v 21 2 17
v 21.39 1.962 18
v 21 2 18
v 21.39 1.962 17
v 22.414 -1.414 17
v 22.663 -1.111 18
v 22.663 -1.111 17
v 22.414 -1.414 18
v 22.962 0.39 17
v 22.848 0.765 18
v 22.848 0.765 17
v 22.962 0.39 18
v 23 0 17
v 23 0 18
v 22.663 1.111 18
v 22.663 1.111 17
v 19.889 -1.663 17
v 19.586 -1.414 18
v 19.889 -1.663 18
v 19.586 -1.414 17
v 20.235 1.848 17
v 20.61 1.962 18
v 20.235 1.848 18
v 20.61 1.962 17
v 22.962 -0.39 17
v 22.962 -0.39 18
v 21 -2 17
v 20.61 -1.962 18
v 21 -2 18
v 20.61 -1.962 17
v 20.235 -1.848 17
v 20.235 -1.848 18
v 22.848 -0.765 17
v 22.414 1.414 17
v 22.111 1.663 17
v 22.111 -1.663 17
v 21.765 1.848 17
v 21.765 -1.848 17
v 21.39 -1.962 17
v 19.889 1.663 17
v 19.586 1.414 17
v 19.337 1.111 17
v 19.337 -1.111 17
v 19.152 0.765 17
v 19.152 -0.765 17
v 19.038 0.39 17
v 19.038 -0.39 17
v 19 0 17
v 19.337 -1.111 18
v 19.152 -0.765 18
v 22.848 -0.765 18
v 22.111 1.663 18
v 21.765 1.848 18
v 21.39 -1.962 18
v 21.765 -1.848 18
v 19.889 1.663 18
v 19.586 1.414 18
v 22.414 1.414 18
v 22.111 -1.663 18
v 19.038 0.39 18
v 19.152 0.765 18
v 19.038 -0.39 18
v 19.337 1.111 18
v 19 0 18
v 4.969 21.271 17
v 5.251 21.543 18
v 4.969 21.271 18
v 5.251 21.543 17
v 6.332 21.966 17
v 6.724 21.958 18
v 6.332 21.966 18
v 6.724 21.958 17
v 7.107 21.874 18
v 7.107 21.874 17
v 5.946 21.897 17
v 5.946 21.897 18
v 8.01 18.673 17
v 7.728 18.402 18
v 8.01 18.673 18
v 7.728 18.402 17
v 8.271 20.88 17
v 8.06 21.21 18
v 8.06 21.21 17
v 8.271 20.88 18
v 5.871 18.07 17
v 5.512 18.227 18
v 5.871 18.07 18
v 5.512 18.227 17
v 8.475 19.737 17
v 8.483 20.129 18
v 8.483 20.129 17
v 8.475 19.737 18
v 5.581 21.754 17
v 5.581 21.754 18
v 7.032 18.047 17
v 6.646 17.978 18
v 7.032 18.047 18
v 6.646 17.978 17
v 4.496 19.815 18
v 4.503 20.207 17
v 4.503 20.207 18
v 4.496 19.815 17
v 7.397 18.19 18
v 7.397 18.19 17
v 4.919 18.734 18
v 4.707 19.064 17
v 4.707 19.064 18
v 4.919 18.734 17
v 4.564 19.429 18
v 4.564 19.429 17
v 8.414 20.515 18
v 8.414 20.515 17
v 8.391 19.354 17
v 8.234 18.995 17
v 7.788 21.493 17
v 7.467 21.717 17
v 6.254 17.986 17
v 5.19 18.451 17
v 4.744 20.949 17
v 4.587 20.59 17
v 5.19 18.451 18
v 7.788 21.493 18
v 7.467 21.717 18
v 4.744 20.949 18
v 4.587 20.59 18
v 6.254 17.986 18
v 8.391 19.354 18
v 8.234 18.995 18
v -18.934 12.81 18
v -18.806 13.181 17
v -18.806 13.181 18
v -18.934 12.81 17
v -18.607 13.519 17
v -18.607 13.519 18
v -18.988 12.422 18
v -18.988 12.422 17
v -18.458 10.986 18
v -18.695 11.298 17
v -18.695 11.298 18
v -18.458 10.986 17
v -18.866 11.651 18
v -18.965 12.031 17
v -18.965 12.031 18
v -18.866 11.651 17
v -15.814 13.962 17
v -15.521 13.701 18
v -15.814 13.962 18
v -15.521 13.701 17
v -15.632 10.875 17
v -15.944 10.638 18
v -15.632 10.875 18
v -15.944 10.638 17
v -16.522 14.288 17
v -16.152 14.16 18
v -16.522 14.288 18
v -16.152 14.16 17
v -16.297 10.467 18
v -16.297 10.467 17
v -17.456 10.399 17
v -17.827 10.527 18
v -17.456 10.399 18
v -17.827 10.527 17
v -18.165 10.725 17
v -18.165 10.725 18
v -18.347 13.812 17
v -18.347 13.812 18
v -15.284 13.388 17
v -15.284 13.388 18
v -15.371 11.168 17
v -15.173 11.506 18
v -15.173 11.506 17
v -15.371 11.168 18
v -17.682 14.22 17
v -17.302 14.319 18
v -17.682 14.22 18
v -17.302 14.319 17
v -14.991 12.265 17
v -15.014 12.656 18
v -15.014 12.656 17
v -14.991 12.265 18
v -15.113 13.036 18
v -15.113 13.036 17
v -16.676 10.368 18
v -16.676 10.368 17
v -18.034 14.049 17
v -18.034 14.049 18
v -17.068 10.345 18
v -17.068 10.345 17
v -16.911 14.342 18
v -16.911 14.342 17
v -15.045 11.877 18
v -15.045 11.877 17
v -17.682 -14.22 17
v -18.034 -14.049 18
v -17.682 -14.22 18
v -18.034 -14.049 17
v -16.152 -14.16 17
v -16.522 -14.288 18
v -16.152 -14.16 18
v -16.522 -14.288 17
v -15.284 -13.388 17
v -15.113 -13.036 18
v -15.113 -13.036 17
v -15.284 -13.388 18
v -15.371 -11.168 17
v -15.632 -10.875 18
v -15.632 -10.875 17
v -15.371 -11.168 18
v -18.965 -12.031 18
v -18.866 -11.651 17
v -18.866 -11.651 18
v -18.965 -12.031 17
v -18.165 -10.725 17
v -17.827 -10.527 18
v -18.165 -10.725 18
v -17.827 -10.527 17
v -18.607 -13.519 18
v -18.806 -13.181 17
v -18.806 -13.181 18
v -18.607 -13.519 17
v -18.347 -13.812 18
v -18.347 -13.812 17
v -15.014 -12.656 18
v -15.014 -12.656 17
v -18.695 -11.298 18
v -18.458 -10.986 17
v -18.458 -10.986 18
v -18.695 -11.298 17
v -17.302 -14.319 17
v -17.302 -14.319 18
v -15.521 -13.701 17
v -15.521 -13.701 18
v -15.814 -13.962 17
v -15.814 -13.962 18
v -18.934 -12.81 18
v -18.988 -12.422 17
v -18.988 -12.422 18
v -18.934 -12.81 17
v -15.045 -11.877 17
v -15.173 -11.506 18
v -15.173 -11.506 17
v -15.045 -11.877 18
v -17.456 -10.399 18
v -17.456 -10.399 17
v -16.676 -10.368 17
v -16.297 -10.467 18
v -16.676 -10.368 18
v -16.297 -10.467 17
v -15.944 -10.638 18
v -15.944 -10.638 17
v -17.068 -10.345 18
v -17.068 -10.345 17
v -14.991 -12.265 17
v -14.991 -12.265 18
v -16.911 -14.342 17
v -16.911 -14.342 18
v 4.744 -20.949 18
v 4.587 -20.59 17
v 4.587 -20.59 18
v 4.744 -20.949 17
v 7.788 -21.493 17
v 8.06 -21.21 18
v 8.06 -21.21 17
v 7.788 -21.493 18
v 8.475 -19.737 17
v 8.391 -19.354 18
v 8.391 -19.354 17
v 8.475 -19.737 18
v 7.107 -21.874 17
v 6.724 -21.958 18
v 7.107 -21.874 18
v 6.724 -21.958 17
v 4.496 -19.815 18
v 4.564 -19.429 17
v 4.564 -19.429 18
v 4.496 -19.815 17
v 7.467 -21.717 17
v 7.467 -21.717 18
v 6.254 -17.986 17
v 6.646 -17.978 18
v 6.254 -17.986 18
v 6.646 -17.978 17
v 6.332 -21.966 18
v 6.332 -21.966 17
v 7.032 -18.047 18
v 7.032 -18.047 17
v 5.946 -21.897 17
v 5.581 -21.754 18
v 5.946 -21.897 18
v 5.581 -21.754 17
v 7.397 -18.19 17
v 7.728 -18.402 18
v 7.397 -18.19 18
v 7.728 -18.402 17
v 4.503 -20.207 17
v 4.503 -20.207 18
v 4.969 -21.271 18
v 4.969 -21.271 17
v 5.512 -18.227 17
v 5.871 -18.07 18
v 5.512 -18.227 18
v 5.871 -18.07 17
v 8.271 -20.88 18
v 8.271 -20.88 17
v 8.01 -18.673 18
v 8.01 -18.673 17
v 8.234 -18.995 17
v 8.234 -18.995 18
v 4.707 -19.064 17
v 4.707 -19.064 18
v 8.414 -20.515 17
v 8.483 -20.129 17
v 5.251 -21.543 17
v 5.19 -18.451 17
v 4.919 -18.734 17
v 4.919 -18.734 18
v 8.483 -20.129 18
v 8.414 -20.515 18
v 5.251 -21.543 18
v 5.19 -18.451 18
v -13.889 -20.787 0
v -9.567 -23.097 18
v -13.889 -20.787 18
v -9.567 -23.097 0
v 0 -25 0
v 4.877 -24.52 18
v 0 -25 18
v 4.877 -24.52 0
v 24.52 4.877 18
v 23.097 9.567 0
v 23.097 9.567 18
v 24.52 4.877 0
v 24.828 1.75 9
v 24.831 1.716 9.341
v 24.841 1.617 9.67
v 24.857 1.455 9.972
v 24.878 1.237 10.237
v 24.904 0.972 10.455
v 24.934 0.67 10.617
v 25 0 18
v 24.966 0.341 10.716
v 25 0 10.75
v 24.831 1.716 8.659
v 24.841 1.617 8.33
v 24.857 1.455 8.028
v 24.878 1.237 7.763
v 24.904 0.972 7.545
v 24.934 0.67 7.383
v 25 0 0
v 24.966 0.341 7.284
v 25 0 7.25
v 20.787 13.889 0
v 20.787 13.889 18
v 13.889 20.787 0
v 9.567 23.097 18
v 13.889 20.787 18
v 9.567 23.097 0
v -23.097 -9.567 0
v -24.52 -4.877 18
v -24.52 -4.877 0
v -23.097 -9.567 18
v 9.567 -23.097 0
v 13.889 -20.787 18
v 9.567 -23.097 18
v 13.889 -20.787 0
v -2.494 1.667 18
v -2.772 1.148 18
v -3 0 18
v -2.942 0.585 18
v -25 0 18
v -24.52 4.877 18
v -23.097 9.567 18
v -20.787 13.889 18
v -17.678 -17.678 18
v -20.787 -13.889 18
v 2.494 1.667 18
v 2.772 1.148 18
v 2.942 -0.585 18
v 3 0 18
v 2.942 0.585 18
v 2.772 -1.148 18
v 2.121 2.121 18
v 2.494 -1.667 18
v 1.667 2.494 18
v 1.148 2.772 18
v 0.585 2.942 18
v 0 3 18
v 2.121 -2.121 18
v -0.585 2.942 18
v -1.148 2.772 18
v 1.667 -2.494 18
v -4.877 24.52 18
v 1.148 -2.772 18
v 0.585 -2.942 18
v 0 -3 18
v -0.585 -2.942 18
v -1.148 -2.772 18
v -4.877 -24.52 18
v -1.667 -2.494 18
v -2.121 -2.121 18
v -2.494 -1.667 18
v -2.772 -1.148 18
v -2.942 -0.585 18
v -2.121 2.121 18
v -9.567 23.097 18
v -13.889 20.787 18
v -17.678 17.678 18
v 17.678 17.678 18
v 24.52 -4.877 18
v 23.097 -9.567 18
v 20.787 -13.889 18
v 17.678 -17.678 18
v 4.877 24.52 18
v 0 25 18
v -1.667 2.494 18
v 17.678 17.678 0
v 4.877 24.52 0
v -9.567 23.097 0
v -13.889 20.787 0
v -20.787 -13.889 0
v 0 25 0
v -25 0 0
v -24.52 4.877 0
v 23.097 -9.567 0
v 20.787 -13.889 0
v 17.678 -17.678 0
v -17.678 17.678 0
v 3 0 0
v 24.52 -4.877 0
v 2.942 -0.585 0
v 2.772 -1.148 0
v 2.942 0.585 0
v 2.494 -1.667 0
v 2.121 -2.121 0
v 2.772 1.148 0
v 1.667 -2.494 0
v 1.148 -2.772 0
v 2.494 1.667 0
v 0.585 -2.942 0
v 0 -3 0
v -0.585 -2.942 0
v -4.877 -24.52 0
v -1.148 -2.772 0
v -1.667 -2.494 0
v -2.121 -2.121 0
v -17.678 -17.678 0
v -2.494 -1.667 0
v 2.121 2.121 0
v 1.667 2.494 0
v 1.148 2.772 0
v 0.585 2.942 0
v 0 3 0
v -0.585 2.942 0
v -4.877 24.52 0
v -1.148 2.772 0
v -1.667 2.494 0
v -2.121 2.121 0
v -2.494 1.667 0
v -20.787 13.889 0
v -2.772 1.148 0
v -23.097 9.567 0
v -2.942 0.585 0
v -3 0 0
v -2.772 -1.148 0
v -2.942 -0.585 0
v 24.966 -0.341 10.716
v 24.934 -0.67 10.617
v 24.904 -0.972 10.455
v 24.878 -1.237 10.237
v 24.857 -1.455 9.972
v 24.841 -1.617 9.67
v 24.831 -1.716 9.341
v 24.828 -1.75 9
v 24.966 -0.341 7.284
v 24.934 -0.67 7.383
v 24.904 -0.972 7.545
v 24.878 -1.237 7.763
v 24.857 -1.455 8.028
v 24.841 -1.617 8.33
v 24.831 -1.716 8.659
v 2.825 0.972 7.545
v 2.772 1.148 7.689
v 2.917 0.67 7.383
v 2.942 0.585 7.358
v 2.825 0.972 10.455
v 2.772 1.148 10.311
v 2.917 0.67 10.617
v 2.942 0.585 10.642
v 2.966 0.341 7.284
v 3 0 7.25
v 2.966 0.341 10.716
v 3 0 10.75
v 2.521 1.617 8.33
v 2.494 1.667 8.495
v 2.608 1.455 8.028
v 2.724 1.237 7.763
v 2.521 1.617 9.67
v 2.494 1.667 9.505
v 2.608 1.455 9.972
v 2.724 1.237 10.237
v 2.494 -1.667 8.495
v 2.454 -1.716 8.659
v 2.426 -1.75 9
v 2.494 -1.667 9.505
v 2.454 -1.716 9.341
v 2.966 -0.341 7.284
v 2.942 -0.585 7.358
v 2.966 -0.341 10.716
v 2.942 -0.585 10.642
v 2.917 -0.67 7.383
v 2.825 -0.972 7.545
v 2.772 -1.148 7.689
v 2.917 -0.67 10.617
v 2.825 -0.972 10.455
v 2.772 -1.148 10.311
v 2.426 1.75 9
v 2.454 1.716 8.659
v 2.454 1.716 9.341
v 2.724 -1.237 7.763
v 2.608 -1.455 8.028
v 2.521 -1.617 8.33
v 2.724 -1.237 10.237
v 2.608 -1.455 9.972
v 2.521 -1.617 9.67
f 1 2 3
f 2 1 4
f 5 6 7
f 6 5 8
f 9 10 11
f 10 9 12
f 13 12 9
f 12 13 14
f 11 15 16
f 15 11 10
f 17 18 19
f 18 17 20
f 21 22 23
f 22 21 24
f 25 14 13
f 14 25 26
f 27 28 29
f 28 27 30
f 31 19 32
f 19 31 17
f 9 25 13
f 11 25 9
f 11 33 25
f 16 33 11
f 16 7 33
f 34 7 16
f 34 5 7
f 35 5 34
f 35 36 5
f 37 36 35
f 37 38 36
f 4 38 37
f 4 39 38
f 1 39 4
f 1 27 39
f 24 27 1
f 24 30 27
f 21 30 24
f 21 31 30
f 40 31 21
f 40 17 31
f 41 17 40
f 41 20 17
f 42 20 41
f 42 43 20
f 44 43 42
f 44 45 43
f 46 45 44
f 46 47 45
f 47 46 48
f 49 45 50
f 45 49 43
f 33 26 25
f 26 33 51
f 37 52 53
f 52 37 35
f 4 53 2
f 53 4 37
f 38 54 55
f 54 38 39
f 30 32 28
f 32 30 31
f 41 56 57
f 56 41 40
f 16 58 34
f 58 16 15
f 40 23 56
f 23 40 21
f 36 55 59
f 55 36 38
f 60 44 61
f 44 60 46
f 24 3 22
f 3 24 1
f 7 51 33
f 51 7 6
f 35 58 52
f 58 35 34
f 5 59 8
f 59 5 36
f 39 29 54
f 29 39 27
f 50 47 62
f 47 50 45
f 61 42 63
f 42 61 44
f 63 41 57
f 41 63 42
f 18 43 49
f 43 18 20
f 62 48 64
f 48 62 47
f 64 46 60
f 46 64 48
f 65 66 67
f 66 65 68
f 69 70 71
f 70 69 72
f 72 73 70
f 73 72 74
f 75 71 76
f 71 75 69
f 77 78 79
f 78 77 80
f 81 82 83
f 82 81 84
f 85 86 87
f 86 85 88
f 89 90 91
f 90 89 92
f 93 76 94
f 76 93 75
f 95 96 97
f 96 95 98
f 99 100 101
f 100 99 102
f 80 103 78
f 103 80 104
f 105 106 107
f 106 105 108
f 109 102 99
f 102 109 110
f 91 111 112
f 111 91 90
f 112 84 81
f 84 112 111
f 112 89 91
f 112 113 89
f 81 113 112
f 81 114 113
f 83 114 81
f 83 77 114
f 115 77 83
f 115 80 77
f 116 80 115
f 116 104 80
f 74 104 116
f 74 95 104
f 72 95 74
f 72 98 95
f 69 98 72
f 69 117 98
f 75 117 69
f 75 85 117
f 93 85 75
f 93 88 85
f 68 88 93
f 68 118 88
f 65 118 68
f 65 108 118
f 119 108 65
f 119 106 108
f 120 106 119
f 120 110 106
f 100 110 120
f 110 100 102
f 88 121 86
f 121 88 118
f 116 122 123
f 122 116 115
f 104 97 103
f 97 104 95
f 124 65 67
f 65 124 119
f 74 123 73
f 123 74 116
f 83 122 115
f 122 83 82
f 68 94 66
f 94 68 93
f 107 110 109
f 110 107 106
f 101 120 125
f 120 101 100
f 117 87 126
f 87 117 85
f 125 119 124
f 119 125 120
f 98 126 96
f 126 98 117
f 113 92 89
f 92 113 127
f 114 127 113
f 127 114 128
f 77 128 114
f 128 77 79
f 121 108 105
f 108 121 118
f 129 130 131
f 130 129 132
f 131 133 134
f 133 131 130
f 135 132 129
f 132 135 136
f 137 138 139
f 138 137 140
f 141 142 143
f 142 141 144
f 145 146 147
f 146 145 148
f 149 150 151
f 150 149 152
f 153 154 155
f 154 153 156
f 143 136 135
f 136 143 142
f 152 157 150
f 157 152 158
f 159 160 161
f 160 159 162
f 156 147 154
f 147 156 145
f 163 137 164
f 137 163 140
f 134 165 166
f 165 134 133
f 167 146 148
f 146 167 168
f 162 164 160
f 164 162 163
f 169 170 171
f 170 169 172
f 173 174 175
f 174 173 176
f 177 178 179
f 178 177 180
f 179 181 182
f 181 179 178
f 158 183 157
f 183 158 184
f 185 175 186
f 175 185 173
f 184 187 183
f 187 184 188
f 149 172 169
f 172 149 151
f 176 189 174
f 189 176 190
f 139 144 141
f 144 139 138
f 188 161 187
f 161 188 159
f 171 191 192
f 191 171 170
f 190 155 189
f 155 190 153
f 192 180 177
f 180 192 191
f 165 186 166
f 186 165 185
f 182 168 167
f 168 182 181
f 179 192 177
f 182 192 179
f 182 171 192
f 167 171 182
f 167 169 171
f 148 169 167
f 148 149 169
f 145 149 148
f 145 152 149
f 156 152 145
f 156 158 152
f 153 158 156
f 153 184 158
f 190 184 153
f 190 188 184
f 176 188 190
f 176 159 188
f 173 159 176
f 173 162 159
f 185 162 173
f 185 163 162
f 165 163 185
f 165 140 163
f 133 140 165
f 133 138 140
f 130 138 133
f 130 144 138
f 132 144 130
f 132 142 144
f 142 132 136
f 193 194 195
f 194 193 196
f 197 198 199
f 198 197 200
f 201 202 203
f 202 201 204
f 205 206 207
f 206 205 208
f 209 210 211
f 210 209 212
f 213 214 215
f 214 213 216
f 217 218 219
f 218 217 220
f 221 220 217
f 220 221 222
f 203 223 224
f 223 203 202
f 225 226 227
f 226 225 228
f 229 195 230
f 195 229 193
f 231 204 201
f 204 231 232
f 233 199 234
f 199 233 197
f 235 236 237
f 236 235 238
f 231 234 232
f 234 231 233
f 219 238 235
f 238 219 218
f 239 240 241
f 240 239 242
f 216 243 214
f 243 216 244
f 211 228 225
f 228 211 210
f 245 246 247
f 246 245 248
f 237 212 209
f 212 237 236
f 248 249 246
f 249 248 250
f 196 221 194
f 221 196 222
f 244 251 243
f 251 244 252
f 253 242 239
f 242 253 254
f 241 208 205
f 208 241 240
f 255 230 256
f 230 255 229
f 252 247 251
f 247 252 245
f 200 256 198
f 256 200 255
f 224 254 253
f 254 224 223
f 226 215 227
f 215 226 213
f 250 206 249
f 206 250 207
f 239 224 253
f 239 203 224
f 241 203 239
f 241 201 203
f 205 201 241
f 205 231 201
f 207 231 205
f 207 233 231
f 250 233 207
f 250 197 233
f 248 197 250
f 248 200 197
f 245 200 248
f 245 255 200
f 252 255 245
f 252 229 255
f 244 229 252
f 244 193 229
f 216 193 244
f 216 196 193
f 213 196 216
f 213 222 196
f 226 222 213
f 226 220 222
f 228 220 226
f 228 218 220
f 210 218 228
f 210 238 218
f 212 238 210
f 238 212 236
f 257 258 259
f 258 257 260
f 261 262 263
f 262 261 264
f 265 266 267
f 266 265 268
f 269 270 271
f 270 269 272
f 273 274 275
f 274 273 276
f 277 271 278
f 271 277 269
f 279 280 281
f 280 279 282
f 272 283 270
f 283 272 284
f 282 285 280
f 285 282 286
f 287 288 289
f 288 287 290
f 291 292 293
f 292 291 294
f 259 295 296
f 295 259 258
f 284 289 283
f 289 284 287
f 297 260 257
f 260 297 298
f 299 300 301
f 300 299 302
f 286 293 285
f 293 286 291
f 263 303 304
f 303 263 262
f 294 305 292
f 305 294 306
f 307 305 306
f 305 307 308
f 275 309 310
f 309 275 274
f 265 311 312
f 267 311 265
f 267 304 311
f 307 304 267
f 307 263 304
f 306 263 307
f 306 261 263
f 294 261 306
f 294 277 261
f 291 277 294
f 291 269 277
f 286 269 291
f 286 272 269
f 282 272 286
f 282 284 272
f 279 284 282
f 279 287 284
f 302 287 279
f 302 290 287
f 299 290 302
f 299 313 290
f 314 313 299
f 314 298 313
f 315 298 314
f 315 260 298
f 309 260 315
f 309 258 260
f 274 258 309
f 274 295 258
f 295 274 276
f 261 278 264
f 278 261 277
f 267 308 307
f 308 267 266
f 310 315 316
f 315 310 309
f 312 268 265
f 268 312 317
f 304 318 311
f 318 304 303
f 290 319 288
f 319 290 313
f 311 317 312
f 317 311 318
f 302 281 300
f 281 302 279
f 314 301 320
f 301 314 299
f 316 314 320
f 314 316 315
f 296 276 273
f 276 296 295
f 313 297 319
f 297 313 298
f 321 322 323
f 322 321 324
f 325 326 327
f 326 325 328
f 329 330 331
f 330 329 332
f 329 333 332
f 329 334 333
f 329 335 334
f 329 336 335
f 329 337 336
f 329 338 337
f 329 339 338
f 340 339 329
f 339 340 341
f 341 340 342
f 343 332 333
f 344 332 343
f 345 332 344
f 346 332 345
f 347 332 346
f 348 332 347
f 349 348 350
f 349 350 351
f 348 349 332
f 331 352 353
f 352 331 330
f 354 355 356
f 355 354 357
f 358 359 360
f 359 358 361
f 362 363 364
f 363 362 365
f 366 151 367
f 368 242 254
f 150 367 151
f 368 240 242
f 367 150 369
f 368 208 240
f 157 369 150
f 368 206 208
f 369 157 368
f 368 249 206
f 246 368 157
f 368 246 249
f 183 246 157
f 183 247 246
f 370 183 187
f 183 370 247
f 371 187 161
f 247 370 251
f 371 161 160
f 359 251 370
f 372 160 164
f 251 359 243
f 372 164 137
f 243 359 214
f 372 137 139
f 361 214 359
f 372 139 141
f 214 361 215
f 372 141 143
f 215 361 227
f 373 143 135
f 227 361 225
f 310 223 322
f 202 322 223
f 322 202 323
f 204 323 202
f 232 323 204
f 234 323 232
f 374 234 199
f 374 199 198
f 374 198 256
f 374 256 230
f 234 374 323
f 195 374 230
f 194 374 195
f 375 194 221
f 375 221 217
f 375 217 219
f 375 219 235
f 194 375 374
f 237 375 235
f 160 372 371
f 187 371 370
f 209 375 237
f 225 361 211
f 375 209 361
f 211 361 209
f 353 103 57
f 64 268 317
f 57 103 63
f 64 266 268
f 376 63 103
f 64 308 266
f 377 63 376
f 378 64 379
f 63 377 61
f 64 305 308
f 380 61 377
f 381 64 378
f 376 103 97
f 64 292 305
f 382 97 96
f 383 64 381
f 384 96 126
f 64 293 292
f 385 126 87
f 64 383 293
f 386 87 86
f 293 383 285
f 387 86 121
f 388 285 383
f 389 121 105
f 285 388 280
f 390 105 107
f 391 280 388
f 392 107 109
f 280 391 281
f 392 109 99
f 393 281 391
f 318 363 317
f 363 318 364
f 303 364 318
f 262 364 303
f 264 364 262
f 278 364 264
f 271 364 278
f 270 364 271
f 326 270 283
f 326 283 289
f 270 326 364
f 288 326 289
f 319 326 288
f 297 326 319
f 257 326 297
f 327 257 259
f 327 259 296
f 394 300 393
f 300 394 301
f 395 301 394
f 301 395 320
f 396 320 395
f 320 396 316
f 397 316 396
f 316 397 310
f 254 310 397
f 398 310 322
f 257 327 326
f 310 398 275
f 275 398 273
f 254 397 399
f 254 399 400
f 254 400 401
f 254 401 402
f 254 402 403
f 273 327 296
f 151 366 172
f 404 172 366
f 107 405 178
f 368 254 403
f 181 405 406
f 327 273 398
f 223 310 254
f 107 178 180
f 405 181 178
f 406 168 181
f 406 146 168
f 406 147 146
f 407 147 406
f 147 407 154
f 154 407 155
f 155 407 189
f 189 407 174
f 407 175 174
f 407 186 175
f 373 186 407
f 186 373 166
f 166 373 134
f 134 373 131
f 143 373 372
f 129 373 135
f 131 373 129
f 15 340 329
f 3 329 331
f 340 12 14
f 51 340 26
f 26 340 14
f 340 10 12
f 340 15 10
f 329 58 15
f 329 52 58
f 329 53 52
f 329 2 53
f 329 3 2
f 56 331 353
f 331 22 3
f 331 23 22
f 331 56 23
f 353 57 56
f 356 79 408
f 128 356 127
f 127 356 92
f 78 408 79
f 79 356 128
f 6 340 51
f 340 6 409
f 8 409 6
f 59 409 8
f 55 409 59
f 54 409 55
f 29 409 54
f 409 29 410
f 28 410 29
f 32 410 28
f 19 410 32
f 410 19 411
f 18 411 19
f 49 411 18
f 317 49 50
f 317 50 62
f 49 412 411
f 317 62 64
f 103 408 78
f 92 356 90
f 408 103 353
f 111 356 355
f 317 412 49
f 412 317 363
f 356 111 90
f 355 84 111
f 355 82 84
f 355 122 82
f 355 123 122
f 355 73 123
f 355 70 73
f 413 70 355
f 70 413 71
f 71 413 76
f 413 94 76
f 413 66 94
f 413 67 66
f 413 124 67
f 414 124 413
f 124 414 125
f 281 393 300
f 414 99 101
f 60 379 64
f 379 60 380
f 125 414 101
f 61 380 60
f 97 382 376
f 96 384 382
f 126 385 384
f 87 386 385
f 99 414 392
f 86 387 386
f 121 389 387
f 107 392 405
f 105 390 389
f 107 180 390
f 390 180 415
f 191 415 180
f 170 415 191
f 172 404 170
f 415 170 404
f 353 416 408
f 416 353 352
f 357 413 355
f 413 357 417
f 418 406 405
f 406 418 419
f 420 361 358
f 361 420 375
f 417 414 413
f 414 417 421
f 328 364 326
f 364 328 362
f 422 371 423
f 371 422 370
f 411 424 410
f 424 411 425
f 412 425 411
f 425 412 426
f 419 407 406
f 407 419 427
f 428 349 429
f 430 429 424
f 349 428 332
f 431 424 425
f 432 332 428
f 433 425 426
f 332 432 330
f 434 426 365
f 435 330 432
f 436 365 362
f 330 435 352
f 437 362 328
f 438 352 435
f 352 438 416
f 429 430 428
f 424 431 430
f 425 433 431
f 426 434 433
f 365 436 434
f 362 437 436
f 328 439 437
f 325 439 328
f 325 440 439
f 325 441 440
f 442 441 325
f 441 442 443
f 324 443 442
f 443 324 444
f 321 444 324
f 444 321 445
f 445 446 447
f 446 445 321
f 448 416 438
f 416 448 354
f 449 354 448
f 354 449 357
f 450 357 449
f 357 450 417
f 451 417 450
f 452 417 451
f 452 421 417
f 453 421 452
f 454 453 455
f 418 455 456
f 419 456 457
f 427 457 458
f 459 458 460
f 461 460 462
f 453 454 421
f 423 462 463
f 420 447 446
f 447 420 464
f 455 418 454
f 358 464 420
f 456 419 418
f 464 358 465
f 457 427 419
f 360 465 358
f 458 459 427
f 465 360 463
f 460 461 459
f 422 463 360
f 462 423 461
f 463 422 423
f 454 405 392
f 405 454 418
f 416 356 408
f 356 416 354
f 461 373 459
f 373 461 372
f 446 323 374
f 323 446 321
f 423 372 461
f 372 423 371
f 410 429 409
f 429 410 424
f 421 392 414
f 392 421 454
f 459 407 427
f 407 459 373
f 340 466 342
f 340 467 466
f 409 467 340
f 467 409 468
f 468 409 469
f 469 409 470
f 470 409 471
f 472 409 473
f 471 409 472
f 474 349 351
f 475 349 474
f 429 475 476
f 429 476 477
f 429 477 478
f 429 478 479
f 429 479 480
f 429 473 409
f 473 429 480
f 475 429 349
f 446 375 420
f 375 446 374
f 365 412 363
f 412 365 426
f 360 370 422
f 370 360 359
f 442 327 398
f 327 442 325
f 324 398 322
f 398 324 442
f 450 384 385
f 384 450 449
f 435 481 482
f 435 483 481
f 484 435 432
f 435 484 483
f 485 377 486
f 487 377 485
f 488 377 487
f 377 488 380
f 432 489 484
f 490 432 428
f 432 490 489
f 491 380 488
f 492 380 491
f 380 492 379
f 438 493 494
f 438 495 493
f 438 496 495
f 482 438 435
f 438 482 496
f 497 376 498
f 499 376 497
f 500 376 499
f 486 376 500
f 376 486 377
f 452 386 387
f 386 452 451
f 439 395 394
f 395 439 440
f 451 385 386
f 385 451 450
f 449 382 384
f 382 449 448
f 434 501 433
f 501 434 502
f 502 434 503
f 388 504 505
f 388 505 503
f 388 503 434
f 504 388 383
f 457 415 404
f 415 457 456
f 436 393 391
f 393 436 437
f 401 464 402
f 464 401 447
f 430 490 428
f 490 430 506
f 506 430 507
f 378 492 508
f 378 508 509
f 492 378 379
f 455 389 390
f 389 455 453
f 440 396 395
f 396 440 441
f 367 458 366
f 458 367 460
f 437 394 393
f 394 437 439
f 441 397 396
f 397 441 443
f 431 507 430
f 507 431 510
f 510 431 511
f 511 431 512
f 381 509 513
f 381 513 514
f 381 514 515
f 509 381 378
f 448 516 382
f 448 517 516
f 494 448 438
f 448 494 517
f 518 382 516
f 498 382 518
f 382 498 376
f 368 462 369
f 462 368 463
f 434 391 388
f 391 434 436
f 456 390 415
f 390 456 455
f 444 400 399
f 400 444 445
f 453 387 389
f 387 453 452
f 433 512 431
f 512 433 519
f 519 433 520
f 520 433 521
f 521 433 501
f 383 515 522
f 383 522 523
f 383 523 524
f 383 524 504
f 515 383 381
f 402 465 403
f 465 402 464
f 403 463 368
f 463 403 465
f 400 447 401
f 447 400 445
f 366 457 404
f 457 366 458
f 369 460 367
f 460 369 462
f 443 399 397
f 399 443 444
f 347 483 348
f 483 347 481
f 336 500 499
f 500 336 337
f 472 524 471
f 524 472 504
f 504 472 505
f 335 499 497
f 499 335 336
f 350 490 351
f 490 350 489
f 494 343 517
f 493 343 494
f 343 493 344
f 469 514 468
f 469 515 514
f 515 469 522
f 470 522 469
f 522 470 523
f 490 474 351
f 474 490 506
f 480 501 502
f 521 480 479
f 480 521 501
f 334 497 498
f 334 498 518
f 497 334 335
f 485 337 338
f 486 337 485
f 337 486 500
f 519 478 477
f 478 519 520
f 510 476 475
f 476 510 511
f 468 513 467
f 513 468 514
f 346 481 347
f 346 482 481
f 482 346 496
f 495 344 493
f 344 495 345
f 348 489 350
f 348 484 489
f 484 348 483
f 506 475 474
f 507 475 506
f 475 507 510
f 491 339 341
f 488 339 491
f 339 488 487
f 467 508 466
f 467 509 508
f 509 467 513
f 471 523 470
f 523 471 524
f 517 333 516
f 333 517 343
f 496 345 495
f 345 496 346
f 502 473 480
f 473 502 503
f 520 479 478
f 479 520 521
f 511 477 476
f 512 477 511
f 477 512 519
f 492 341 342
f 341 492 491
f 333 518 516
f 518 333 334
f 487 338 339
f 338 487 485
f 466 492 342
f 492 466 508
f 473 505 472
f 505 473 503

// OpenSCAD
$fn = 32;

// ----------------------------------------------------------------------
// Control knob: dimpled knob
// ----------------------------------------------------------------------

// --- parameters (mm) ---
dimp_d = 4;               // finger dimple diameter
n_dimp = 5;               // number of dimples
dimp_r = 21;              // dimple ring radius
knob_d = 50;              // knob body diameter
knob_h = 18;              // knob body height
bore_d = 6;               // shaft bore diameter
set_d = 3.5;              // set screw bore diameter

dimp_step = 360 / n_dimp;  // dimple angular step

difference() {
  cylinder(h = knob_h, d = knob_d);
  translate([0, 0, -1]) cylinder(h = knob_h + 2, d = bore_d);
  translate([-1, 0, knob_h / 2]) rotate([0, 90, 0])
    cylinder(h = knob_d / 2 + bore_d / 2 + 2, d = set_d);  for (i = [0 : n_dimp - 1])
    rotate([0, 0, i * dimp_step])
      translate([dimp_r, 0, knob_h - 1])
        cylinder(h = 2, d = dimp_d);
}
